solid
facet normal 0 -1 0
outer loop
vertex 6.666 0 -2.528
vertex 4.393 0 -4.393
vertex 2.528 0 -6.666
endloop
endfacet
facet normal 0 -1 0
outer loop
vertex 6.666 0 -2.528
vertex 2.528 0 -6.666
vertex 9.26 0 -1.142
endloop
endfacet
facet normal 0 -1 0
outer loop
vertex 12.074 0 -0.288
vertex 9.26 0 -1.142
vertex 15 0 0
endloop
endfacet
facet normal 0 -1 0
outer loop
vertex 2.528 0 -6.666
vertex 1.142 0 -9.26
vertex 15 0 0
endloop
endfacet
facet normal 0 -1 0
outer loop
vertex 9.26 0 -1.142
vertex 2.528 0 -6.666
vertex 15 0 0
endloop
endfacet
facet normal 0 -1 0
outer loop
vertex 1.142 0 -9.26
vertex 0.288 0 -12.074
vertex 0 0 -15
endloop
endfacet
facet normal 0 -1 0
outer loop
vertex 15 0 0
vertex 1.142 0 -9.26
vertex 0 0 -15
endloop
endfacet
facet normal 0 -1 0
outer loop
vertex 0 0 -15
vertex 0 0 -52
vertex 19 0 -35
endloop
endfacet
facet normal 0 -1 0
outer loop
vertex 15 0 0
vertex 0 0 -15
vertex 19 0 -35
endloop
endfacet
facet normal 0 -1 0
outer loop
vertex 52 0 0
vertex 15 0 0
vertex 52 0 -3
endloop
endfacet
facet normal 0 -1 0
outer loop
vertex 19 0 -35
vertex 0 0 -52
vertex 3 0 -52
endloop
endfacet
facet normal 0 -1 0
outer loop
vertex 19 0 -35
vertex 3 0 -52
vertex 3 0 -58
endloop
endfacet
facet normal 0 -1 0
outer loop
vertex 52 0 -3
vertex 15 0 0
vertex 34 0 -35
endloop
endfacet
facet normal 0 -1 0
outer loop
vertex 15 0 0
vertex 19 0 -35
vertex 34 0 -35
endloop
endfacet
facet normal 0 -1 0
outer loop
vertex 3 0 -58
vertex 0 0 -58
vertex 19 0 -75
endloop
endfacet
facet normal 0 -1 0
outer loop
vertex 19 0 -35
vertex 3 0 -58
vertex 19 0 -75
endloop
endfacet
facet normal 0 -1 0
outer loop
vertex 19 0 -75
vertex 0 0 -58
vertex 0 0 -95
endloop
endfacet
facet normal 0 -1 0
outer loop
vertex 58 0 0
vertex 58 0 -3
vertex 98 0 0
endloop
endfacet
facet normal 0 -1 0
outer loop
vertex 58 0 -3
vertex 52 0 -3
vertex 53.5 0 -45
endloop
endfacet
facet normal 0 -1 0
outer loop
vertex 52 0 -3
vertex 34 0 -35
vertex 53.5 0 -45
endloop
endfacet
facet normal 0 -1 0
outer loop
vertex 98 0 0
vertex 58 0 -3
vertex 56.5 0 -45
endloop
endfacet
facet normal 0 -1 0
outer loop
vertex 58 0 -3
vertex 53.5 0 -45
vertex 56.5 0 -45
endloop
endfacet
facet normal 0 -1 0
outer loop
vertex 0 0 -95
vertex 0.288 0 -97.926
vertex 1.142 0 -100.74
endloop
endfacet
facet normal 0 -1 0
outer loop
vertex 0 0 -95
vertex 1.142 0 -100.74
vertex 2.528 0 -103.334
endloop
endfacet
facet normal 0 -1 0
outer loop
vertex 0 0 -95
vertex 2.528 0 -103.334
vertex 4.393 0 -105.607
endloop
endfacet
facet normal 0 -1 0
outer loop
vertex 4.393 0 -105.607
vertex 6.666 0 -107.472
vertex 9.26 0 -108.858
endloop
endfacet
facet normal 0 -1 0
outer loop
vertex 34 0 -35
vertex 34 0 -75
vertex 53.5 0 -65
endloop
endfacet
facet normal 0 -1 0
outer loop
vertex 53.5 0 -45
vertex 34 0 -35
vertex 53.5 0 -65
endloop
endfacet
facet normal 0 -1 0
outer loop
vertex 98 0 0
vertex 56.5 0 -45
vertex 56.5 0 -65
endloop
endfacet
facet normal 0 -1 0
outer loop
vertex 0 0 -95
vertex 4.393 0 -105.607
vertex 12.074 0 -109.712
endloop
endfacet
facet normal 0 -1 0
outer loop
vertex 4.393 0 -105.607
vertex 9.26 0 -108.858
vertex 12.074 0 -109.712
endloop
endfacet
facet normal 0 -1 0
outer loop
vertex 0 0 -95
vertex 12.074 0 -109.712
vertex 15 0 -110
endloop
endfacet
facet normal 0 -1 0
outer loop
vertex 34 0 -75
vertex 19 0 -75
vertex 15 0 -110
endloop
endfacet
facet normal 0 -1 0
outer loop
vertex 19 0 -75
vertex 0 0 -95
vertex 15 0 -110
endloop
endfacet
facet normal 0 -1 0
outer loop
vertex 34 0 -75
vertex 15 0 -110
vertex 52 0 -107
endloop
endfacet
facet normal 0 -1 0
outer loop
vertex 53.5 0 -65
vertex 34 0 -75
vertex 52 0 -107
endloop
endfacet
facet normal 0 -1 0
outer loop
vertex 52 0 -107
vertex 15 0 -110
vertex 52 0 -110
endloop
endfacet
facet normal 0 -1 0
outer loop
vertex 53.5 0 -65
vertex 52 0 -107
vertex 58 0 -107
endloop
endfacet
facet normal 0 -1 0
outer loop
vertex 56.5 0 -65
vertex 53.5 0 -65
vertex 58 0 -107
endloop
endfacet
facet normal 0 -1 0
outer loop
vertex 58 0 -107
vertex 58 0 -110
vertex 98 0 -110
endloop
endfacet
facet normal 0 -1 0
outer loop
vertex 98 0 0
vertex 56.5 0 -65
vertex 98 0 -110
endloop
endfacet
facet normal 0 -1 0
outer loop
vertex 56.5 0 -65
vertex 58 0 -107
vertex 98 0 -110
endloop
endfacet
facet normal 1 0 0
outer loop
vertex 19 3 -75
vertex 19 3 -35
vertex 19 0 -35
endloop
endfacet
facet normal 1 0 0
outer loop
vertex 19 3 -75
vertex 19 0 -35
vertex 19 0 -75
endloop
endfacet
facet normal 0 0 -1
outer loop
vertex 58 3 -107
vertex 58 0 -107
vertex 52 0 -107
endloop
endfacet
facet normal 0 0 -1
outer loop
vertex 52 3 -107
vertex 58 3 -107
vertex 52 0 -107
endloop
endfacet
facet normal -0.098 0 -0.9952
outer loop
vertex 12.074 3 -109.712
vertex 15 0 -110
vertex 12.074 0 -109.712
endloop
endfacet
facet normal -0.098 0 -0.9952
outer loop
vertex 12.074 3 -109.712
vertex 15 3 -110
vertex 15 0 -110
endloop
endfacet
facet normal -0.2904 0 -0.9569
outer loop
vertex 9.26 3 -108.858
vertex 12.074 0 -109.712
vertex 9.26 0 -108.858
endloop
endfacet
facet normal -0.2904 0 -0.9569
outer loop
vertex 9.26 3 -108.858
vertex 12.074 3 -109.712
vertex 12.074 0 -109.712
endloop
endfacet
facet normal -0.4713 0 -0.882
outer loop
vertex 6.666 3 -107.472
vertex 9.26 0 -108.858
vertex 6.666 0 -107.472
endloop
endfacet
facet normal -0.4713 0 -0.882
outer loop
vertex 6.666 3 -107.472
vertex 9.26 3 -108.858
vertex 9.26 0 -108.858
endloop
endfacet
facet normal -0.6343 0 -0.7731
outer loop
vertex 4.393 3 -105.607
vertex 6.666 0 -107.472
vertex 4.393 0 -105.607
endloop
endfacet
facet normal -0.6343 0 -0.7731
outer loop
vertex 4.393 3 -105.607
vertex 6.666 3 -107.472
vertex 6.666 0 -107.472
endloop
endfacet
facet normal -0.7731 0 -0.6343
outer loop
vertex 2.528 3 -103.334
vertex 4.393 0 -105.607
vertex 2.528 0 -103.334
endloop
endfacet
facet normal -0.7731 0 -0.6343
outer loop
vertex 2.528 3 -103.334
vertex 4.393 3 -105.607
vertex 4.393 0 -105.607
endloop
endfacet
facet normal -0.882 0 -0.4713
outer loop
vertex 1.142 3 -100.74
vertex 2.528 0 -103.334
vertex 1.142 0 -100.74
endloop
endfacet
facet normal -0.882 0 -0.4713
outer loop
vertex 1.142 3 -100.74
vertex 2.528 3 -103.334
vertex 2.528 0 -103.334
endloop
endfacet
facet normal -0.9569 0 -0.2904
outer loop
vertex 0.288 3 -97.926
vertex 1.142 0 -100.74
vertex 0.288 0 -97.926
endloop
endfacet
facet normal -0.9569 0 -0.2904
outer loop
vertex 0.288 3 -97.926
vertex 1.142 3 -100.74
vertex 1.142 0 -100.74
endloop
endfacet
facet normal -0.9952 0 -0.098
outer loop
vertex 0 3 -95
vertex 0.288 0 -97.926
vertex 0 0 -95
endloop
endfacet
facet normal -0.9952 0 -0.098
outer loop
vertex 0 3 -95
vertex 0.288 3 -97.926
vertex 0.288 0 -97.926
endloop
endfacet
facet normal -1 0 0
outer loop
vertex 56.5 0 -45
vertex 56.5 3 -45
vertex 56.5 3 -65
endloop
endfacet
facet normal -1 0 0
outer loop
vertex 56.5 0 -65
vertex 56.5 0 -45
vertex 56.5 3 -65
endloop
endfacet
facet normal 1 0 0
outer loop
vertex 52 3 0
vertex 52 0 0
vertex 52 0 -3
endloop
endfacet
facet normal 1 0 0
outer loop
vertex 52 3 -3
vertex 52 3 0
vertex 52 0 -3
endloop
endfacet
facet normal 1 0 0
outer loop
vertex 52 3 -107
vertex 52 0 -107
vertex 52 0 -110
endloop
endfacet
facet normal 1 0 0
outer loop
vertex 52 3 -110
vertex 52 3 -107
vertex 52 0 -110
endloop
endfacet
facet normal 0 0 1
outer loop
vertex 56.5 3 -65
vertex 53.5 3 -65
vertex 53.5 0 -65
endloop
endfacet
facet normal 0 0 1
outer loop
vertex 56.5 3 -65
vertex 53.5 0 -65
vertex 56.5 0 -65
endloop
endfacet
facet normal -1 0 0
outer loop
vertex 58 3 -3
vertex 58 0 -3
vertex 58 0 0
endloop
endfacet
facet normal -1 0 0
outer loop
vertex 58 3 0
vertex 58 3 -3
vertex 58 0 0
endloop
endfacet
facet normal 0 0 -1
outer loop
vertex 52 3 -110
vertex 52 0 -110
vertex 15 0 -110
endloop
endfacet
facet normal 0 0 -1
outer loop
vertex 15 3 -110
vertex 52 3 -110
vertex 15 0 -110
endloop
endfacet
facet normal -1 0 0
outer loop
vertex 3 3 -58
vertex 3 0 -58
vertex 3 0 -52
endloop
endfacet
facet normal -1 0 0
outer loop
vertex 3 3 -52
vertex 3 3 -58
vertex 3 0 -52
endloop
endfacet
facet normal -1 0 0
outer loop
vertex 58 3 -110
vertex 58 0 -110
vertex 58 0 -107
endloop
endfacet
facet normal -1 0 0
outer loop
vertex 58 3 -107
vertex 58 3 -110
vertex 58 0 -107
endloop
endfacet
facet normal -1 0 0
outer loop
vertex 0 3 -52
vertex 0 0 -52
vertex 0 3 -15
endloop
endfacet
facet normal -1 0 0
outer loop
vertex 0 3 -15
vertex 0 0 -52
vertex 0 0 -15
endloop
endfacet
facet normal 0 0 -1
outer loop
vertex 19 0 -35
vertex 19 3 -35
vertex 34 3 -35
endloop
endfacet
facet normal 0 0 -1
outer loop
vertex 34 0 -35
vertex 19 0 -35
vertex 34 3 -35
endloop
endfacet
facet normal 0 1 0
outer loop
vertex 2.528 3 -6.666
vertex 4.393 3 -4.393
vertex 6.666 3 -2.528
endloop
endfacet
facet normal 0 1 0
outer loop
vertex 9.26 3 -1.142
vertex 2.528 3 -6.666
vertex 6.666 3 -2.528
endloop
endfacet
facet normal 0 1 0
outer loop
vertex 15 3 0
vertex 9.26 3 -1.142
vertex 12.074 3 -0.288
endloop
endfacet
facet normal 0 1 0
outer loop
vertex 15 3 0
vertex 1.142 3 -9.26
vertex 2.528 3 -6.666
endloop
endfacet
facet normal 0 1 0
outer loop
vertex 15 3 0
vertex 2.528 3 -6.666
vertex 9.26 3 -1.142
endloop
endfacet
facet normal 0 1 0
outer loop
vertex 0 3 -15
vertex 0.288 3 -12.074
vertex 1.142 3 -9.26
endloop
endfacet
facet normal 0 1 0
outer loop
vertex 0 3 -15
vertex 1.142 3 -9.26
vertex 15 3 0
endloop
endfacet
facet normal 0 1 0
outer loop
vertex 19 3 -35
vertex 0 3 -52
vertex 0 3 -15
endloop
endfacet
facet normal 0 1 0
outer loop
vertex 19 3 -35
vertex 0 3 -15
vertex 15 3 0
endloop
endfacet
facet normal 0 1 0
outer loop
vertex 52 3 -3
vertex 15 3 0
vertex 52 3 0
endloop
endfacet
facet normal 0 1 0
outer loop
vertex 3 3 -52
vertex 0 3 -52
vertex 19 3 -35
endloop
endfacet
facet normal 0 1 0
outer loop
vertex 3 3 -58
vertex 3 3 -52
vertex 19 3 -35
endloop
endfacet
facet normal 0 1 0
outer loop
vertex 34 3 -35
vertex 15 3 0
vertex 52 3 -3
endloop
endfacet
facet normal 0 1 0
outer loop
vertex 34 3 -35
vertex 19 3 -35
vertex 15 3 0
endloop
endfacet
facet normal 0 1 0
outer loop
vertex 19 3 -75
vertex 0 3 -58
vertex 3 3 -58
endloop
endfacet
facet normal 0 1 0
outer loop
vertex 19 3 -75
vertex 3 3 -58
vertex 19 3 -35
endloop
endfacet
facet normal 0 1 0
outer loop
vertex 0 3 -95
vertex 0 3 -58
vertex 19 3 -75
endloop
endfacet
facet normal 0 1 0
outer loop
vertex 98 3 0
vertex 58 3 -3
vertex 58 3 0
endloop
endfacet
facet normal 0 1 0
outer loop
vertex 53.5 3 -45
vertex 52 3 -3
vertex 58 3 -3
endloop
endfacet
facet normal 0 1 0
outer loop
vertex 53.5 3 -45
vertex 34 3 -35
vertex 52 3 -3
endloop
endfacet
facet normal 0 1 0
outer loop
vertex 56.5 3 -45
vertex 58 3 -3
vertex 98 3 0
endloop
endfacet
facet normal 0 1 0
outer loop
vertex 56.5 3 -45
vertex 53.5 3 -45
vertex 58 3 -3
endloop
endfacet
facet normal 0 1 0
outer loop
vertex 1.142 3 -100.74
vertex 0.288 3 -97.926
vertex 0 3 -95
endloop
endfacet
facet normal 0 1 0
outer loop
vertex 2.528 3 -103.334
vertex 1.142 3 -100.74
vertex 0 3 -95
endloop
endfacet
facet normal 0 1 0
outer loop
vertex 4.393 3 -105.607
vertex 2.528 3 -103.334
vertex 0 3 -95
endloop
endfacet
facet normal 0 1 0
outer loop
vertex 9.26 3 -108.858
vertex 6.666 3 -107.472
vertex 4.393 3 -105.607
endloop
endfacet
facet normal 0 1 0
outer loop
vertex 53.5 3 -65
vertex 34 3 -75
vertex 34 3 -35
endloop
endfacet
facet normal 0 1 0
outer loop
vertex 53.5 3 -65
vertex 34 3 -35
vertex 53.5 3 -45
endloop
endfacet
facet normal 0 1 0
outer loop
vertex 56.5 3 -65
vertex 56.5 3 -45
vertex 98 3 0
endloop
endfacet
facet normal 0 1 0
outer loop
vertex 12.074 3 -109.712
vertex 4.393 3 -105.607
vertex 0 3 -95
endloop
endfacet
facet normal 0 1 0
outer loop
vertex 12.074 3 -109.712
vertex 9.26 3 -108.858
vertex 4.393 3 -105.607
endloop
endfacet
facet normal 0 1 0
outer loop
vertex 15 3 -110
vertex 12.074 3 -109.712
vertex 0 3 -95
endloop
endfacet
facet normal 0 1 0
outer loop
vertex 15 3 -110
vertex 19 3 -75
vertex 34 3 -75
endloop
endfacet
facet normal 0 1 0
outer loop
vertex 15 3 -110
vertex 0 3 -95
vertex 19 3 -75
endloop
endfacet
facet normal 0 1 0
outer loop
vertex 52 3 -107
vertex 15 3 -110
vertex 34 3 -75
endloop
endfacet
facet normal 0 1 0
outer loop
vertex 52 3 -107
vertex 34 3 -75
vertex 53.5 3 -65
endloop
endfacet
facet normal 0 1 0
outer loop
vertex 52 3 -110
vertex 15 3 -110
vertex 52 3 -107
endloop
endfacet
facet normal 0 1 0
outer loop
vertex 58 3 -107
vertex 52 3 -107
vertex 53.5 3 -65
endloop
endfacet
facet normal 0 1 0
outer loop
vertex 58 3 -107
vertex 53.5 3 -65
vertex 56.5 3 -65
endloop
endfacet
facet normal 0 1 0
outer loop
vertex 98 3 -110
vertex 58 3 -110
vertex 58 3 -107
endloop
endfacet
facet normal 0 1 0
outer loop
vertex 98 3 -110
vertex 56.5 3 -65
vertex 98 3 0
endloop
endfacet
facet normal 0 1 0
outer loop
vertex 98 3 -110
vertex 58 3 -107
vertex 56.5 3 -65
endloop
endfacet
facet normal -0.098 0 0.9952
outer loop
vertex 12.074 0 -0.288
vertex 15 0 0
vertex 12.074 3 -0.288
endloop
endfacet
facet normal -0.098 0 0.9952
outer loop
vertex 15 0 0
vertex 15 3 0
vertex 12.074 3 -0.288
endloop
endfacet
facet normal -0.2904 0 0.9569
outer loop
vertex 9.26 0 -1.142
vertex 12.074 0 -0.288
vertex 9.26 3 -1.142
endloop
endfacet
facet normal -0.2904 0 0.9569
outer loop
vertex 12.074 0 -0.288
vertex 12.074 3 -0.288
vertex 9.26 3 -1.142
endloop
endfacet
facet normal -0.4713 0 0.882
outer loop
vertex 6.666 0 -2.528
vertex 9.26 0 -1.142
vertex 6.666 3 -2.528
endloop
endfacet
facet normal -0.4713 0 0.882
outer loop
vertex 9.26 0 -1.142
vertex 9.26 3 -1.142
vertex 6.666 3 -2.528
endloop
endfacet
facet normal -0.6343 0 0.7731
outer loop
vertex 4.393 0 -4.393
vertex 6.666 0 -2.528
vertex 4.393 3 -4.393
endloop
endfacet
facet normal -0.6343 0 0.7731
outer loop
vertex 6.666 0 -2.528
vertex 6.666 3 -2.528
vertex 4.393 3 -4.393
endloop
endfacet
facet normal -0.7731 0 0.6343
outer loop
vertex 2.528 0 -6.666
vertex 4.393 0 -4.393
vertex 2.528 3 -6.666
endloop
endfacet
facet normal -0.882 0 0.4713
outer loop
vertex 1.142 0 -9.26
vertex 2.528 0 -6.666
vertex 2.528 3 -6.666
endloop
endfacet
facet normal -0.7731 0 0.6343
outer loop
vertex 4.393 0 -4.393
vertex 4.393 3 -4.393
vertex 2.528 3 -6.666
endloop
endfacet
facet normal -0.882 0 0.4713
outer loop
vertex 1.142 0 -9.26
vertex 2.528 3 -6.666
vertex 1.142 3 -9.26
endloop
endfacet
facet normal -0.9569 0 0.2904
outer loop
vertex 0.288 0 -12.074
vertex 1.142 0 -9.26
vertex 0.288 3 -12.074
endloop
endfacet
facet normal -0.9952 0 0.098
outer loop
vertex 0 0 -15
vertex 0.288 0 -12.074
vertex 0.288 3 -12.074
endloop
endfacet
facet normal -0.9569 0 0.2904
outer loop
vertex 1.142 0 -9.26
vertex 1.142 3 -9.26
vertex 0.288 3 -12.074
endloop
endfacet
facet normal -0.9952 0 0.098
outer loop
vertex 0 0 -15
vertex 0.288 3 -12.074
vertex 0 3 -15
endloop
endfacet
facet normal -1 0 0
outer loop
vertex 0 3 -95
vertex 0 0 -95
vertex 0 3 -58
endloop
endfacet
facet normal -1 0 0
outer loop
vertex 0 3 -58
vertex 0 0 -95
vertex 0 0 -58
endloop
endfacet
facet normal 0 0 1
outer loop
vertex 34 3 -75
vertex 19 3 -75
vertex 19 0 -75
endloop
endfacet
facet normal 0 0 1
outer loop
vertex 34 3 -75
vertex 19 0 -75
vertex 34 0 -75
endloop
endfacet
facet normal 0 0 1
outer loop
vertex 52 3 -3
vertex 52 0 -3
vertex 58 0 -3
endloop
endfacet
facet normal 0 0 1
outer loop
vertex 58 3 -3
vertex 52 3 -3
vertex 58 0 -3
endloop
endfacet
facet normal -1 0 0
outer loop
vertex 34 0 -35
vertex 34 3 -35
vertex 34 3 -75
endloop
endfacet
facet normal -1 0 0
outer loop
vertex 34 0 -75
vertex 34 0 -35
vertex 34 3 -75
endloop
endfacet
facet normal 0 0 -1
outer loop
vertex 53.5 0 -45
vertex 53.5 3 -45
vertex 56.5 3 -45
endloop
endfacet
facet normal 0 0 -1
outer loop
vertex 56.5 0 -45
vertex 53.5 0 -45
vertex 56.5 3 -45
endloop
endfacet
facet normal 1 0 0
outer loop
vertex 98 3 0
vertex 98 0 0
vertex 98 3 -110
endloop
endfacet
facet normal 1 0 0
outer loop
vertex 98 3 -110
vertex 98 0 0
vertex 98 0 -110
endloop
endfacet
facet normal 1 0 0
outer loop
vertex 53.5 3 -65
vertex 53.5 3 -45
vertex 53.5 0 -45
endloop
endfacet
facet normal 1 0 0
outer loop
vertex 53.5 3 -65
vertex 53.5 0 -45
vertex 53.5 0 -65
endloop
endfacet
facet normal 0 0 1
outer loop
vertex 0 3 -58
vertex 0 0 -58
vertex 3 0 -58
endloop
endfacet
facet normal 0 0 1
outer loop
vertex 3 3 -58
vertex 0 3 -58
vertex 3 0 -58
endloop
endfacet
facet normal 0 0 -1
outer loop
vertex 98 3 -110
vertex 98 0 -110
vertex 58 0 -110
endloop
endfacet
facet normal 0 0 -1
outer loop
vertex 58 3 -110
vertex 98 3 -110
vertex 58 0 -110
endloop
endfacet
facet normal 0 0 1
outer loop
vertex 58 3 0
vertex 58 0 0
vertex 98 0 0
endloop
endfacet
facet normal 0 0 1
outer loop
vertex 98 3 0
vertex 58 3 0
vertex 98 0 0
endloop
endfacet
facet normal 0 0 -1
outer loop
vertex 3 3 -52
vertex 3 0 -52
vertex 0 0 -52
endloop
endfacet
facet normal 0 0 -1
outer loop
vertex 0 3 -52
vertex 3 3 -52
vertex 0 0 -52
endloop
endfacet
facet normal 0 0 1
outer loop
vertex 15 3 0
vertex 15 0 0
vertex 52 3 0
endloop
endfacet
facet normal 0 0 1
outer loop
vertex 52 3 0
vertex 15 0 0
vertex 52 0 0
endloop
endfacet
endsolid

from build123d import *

# Parameters (mm, degrees)
EXTRUDE_3_DEPTH    = 3
SKETCH1_W          = 15
SKETCH1_H          = 40
SKETCH1_W_2        = 3
SKETCH1_H_2        = 20
CUT_EXTRUDE1_DEPTH = 10
FILLET1_R          = 15


with BuildPart() as part:
    # Эскиз4 → Бобышка-Вытянуть3 (new body)
    with BuildSketch(Plane(origin=(0, 0, 0), x_dir=(1, 0, 0), z_dir=(0, 1, 0))):
        Polygon((98, 0), (98, 110), (58, 110), (58, 107), (55, 107), (52, 107), (52, 110), (0, 110), (0, 58), (3, 58), (3, 55), (3, 52), (0, 52), (0, 0), (52, 0), (52, 3), (55, 3), (58, 3), (58, 0), align=None)
    extrude(amount=EXTRUDE_3_DEPTH)

    # Sketch1 → Cut-Extrude1 (cut)
    with BuildSketch(Plane(origin=(0, 3, 0), x_dir=(1, 0, 0), z_dir=(0, 1, 0))):
        with Locations((26.5, 55)):
            Rectangle(SKETCH1_W, SKETCH1_H)
        with Locations((55, 55)):
            Rectangle(SKETCH1_W_2, SKETCH1_H_2)
    extrude(amount=-CUT_EXTRUDE1_DEPTH, mode=Mode.SUBTRACT)

    # Fillet1
    fillet1_edges = [part.edges().sort_by_distance(p)[0] for p in [
        (0, 1.5, 0),
        (0, 1.5, -110),
    ]]
    fillet(fillet1_edges, radius=FILLET1_R)


solid = part.part
